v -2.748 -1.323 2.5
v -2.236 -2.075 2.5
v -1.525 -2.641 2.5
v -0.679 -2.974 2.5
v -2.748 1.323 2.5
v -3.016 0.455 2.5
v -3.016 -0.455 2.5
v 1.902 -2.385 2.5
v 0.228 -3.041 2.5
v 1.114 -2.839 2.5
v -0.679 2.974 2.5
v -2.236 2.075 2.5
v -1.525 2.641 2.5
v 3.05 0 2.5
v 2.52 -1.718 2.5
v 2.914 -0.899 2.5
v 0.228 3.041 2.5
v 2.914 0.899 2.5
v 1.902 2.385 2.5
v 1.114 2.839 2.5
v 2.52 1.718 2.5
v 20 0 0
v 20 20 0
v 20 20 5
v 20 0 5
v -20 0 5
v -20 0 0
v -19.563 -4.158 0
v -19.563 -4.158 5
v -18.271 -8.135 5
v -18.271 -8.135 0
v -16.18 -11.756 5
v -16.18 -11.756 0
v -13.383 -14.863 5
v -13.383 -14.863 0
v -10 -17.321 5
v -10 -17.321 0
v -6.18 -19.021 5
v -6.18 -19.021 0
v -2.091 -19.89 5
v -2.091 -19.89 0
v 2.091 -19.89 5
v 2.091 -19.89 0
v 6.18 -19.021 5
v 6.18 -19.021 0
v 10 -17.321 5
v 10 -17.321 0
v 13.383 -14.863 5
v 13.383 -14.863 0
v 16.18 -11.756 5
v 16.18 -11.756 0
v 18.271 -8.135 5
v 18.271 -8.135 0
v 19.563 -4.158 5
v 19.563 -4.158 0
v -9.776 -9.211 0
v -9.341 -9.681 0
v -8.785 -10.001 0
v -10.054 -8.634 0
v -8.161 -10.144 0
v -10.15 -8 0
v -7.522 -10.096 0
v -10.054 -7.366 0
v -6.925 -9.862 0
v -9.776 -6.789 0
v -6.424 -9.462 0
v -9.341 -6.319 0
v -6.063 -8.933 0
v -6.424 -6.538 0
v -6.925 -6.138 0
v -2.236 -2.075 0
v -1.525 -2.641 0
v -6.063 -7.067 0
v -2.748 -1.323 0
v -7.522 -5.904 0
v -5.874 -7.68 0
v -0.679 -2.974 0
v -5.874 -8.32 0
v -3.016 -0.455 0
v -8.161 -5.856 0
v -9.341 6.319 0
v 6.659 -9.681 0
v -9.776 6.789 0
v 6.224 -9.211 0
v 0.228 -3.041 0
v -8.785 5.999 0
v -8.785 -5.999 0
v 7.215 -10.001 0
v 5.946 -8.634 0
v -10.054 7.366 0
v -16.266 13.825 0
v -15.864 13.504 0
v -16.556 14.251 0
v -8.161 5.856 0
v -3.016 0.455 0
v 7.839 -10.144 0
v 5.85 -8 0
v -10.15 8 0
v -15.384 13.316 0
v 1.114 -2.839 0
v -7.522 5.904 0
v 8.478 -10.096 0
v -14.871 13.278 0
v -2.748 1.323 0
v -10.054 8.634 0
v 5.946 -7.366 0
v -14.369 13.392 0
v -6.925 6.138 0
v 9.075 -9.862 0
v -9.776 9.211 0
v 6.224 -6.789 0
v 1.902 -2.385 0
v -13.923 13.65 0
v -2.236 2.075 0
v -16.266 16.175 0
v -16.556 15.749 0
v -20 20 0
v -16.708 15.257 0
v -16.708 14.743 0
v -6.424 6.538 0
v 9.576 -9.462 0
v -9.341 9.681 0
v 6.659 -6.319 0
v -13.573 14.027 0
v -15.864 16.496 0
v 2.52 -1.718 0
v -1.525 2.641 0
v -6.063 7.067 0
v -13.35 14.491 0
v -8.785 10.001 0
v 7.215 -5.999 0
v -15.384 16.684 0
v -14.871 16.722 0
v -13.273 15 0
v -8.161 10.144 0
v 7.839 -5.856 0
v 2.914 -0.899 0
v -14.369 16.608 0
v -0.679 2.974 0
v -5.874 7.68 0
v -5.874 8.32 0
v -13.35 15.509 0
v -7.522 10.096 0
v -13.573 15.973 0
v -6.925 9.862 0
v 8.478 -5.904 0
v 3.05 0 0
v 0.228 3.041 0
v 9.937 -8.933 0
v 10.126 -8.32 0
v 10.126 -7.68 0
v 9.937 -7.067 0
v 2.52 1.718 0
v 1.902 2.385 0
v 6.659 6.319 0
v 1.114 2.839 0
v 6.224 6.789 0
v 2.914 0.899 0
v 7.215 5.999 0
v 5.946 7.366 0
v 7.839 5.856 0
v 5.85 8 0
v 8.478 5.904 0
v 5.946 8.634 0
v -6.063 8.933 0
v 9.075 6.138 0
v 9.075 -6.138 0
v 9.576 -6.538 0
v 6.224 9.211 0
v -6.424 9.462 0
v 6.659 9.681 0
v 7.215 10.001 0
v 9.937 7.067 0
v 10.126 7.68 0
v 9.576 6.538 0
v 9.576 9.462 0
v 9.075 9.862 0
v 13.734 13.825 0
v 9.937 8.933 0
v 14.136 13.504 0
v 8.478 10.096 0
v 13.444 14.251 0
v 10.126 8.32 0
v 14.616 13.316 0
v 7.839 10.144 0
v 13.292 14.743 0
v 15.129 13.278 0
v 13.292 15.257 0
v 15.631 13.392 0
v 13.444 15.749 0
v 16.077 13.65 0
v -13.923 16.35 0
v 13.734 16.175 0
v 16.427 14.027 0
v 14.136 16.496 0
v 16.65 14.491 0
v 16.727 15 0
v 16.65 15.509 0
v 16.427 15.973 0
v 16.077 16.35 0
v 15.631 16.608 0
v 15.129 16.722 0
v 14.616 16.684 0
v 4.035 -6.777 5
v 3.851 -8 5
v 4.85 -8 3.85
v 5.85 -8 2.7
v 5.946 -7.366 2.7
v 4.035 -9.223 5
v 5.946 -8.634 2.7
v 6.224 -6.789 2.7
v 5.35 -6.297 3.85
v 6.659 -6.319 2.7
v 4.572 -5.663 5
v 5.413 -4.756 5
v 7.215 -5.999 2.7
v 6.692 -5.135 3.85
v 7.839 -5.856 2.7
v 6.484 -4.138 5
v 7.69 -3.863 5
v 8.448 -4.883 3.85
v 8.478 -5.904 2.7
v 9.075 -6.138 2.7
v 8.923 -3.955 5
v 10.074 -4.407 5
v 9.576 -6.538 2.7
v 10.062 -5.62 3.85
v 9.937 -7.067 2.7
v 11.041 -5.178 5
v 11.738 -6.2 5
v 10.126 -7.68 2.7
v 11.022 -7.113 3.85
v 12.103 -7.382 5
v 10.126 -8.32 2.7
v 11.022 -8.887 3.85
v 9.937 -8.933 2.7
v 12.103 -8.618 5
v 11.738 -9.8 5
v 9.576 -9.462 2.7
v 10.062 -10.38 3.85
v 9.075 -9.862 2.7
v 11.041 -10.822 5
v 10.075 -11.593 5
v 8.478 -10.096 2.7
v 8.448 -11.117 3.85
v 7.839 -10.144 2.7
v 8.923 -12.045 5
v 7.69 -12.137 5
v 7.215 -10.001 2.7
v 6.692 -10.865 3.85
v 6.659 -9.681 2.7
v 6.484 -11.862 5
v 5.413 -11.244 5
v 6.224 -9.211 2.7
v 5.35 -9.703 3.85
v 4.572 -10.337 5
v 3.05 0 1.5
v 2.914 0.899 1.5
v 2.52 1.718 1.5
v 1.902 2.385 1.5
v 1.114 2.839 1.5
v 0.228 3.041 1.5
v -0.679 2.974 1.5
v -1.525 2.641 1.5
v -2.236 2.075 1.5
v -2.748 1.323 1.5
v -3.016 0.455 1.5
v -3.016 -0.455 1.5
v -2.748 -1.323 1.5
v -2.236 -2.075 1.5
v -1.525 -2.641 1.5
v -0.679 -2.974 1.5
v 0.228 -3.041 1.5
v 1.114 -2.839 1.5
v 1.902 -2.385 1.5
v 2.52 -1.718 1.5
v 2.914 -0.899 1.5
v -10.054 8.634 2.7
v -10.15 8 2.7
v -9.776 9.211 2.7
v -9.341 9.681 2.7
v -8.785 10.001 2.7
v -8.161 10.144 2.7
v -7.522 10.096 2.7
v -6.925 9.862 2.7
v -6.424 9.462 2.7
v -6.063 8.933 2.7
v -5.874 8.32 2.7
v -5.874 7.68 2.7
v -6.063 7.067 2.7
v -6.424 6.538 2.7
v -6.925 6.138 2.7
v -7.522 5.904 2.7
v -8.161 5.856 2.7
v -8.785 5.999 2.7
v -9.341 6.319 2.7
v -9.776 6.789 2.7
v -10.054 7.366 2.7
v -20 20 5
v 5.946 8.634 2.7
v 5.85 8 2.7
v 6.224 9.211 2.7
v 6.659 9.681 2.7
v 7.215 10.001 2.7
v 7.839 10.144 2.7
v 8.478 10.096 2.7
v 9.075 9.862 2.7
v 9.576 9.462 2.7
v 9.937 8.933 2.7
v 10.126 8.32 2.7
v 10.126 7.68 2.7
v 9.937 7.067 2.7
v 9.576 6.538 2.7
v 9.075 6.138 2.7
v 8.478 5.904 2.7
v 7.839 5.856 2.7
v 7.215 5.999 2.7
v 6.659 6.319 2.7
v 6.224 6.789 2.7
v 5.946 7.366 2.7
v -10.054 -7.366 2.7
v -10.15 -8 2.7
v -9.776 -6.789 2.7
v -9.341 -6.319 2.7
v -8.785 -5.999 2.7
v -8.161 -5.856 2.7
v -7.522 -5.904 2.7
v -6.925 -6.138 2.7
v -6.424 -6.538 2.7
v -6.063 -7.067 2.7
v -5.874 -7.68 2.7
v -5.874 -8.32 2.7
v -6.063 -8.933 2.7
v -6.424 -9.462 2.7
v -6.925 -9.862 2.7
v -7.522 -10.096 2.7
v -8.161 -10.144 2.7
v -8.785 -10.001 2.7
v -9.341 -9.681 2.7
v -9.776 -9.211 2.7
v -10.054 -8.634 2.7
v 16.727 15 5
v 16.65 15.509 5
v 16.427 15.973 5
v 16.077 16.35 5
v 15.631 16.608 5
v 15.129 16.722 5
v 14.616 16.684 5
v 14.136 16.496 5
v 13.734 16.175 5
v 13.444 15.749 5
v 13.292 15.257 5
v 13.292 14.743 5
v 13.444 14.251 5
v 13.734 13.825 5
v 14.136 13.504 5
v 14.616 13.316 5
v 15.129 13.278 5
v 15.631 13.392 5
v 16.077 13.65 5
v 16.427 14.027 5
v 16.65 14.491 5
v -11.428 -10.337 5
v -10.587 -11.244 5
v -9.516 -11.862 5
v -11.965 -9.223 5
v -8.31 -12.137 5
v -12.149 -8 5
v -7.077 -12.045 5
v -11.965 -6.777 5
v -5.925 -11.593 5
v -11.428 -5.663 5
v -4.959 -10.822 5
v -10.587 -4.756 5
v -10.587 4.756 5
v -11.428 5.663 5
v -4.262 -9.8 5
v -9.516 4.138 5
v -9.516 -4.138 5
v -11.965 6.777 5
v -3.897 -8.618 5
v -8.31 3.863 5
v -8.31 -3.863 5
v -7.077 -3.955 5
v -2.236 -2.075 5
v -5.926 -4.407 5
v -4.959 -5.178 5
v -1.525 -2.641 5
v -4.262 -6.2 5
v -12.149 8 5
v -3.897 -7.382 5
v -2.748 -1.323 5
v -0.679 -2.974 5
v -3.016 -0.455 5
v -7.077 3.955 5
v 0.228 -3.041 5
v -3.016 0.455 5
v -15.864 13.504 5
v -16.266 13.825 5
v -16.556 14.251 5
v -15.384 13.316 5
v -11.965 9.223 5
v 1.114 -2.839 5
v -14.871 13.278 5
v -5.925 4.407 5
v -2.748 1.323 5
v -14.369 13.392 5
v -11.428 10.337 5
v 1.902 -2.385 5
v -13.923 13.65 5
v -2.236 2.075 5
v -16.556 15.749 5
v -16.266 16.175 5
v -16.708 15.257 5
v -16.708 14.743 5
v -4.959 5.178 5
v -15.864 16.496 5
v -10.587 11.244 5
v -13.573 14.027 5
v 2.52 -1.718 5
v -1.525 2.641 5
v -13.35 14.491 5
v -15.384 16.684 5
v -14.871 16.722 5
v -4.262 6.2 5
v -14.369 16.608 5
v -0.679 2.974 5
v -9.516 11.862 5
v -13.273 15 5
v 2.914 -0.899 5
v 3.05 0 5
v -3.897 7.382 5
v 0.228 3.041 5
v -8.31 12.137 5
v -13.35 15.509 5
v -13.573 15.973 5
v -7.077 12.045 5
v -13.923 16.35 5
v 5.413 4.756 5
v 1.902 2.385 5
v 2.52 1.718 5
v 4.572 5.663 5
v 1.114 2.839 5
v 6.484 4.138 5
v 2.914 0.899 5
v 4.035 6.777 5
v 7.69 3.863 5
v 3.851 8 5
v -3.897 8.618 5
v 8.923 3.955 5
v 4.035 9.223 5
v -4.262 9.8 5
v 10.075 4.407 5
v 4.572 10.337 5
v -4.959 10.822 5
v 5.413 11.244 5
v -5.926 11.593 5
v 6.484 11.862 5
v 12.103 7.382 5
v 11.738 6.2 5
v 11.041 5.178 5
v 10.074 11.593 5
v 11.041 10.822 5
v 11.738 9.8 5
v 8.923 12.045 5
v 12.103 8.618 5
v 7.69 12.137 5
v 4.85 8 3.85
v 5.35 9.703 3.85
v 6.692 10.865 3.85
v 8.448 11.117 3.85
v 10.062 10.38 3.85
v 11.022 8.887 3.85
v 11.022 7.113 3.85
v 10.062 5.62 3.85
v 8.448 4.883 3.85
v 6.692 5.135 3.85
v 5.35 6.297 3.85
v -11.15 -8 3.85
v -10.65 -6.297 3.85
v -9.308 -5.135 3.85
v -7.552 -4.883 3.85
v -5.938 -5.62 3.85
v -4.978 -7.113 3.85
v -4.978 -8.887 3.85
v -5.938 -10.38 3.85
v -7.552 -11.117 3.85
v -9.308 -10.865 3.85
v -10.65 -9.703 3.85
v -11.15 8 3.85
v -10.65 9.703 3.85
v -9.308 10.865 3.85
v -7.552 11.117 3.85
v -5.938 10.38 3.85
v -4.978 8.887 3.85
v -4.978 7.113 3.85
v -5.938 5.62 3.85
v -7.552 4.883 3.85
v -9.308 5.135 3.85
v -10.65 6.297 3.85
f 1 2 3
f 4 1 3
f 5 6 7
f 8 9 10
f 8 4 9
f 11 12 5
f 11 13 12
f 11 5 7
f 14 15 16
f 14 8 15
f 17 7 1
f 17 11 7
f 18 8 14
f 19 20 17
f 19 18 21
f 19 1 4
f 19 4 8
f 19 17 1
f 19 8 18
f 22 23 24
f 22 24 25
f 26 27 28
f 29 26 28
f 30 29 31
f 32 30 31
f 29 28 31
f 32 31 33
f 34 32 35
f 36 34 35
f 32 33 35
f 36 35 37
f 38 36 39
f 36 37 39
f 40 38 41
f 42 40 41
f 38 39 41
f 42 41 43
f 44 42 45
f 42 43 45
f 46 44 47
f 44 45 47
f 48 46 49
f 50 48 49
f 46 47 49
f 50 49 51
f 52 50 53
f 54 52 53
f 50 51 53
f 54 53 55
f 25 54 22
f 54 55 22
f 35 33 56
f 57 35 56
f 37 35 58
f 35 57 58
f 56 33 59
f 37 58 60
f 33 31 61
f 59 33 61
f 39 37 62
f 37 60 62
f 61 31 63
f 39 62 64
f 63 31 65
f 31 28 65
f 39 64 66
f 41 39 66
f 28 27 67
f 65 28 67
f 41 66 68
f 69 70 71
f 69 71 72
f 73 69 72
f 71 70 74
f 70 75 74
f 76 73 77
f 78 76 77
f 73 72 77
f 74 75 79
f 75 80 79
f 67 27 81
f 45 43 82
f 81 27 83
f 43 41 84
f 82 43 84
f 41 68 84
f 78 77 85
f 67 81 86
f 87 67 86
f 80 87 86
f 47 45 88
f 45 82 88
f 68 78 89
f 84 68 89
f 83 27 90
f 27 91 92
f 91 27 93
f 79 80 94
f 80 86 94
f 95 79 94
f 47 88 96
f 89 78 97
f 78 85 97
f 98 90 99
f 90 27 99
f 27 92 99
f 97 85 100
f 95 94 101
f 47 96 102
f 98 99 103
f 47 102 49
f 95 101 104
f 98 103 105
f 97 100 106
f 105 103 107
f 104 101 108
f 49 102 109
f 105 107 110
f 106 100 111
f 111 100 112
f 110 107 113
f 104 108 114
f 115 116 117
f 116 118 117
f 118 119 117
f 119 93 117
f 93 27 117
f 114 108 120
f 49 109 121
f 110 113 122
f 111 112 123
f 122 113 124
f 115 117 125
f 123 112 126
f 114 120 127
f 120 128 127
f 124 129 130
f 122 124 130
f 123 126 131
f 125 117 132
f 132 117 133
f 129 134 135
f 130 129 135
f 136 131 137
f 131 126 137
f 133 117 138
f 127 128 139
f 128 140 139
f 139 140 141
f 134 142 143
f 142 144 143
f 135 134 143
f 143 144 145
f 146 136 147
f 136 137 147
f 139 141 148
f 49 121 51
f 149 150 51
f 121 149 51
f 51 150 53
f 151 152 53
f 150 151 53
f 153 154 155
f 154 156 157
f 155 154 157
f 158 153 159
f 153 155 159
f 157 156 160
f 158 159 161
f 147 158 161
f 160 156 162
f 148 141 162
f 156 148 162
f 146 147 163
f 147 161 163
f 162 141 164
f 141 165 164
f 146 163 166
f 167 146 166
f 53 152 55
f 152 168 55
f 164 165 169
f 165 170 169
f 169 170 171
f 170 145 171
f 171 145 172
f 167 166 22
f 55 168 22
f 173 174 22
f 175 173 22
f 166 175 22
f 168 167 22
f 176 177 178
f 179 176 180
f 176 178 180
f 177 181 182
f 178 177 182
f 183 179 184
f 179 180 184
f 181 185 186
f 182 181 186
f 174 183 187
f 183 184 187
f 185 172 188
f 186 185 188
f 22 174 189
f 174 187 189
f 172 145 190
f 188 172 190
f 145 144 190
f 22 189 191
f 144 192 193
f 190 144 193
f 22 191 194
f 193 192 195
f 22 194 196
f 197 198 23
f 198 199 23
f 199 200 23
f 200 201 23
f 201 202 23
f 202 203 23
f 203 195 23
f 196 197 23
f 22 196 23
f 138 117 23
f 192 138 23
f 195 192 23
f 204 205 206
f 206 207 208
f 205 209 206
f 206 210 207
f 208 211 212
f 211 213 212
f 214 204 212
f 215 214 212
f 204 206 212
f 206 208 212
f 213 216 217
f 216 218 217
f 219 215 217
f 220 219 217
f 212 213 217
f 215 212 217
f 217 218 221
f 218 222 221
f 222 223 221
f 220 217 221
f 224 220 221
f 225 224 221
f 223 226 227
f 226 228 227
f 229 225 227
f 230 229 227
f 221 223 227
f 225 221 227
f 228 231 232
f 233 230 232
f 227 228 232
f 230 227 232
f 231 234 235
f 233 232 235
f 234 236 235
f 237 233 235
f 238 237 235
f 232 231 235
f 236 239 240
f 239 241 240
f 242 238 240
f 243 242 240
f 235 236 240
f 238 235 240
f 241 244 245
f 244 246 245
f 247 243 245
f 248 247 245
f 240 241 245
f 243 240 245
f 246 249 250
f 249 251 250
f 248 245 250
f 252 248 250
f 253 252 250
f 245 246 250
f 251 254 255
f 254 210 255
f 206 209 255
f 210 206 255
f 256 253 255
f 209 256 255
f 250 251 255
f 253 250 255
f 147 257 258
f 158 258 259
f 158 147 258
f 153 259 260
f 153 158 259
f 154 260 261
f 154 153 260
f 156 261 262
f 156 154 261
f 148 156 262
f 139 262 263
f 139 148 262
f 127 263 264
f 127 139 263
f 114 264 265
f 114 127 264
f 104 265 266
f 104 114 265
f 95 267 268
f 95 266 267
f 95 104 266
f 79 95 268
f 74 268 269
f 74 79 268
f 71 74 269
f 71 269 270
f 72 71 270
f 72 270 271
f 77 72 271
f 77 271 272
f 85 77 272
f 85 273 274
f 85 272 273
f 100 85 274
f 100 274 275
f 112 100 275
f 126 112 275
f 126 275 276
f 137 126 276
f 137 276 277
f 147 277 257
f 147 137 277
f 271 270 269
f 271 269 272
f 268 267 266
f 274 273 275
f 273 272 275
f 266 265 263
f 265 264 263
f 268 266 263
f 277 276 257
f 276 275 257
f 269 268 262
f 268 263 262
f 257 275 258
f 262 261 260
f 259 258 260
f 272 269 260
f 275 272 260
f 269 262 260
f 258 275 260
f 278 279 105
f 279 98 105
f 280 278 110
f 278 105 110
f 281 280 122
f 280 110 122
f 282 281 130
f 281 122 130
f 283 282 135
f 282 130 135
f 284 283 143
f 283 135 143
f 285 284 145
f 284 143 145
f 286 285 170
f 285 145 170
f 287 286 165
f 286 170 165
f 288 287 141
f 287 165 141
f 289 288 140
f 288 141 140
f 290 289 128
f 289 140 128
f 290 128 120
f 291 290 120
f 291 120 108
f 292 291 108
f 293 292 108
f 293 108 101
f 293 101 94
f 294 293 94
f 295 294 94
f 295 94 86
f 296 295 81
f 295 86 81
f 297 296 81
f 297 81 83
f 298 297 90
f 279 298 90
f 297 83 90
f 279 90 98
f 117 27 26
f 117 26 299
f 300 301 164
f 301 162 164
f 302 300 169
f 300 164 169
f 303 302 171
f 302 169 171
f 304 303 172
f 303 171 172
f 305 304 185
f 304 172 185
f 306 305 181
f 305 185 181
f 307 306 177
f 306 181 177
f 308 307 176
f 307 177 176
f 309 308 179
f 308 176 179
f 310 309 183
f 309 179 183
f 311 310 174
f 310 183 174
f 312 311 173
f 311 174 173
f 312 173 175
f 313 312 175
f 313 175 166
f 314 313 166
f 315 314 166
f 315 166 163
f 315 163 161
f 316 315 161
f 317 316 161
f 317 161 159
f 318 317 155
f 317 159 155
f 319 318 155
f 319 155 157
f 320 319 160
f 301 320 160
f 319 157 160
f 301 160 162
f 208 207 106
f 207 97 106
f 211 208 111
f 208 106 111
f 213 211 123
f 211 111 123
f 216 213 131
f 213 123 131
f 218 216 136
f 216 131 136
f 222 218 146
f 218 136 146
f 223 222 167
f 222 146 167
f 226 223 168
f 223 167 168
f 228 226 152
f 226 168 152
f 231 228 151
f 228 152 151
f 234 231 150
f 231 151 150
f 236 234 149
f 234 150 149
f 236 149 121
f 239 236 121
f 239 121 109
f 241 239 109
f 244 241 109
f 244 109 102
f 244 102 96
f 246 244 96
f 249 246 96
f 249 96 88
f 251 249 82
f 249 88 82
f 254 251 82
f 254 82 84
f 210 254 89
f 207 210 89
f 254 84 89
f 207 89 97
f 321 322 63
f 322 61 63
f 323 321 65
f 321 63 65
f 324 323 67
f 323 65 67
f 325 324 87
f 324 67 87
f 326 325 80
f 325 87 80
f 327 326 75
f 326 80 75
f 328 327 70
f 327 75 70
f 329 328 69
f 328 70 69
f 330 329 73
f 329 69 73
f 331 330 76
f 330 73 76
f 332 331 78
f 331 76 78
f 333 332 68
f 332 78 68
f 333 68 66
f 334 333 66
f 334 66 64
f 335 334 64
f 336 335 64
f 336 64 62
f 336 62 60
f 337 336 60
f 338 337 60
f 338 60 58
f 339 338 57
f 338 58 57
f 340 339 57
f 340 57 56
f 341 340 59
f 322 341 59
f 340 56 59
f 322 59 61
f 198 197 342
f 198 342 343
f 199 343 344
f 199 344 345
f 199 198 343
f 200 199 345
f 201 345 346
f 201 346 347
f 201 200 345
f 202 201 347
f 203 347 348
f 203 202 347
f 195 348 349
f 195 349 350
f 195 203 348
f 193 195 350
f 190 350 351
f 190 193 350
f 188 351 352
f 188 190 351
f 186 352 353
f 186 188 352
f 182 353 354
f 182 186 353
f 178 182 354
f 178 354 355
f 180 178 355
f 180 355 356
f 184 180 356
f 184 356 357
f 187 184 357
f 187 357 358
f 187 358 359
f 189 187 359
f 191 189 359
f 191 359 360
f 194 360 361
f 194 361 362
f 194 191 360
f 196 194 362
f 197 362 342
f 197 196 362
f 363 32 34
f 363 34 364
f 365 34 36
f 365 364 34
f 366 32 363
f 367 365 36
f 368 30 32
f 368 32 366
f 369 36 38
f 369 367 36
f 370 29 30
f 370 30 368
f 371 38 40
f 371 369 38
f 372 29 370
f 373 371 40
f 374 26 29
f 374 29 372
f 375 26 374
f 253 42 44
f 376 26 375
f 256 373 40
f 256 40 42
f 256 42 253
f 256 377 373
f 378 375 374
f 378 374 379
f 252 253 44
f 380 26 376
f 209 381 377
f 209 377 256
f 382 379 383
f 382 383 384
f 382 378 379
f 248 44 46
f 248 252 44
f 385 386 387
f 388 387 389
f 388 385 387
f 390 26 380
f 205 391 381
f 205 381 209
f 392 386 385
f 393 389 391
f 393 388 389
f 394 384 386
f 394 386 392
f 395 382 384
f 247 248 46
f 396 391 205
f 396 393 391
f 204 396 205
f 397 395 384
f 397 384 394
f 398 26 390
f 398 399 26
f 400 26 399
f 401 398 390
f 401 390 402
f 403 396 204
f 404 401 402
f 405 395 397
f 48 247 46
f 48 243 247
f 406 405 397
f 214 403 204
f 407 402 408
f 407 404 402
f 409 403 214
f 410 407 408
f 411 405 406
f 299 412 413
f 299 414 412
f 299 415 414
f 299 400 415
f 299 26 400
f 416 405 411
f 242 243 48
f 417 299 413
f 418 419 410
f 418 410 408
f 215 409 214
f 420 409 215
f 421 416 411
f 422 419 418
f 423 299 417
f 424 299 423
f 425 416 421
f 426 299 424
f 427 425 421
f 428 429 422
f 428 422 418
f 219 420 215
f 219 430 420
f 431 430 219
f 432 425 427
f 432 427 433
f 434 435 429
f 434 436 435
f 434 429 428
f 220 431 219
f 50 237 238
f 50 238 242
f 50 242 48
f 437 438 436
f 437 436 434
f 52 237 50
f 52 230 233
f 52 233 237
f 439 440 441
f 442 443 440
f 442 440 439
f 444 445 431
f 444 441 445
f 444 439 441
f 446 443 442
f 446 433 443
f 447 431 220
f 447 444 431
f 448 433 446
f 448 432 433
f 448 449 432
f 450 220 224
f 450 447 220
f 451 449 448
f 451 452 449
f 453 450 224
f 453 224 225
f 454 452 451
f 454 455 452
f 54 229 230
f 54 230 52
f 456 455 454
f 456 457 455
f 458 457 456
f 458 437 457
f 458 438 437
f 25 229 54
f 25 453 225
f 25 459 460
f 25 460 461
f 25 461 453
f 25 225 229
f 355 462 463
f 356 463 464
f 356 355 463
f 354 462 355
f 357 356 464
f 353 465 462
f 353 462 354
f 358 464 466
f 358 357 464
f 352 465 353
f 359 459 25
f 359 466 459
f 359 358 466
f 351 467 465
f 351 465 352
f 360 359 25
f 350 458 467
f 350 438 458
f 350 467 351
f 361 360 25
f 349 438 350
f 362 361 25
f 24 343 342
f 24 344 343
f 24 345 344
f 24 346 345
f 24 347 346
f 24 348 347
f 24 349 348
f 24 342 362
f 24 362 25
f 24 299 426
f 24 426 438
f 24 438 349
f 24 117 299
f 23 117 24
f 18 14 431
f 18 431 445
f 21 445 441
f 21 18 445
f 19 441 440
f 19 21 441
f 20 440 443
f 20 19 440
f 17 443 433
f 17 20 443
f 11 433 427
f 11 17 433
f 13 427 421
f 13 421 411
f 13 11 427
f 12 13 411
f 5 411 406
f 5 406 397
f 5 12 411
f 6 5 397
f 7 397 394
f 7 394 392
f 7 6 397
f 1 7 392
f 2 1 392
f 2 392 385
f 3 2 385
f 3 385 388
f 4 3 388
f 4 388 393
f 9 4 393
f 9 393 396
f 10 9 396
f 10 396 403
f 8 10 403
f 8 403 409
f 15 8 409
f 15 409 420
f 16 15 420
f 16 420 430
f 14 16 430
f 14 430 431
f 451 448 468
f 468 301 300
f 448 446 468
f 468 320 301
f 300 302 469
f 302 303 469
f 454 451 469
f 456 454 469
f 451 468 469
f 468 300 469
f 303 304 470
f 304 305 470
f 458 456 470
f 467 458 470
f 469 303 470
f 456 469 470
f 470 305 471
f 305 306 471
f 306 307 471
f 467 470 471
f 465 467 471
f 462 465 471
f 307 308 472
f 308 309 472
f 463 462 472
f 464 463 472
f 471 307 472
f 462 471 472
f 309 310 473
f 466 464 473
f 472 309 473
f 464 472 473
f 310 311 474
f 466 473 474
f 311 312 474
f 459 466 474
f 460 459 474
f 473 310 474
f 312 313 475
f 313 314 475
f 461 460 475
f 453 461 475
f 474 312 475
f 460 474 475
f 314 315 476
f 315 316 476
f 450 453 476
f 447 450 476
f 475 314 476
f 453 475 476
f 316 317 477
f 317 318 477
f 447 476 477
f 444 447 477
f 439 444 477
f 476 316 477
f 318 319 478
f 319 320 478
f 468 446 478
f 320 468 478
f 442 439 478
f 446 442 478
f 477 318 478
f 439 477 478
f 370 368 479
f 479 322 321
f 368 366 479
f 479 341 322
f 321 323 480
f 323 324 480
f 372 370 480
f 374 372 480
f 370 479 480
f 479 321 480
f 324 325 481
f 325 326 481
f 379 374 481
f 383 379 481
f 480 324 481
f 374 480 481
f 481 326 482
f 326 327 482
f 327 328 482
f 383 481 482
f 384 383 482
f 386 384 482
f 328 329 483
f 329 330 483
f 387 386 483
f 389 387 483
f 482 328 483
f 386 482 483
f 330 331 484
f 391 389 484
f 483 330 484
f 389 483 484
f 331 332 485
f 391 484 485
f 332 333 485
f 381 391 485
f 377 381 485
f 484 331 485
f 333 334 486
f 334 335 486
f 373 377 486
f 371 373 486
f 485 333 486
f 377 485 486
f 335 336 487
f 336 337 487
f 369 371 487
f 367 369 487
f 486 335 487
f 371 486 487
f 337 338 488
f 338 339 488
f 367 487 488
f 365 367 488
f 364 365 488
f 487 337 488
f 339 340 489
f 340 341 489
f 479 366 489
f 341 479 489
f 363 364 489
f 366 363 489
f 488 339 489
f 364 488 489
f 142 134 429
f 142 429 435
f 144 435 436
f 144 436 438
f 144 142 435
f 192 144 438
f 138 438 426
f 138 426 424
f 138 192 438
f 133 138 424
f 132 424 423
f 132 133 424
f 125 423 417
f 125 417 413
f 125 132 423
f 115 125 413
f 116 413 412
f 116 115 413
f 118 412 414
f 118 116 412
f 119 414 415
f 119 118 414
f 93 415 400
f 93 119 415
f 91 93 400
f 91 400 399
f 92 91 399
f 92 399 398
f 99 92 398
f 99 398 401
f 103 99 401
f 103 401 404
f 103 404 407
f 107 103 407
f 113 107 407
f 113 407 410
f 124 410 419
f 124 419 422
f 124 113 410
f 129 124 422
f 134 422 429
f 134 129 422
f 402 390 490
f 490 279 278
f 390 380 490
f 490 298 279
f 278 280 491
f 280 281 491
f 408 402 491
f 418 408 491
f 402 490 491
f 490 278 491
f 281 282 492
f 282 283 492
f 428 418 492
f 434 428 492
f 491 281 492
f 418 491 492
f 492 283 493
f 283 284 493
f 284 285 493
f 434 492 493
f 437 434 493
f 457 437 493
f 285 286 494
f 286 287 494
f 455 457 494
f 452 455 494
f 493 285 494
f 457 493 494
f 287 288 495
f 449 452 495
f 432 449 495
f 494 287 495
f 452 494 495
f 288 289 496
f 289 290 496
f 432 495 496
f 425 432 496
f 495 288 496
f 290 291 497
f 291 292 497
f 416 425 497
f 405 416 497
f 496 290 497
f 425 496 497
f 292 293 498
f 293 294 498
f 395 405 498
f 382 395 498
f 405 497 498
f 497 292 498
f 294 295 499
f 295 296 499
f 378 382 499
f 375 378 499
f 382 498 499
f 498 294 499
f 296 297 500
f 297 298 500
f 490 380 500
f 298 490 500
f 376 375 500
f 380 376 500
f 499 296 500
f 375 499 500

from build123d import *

# Parameters (mm, degrees)
SKETCH104_R         = 3.05
SKETCH104_R_2       = 1.7272
PAD063_DEPTH        = 5
HOLE008_D           = 4.3
HOLE008_CSINK_D     = 8.298
HOLE008_CSINK_ANGLE = 82
SKETCH106_R         = 3.5
PAD064_DEPTH        = 1


with BuildPart() as part:
    # Sketch104 → Pad063 (new body)
    with BuildSketch(Plane.XY):
        with BuildLine():
            ThreePointArc((-20, 0), (0, -20), (20, 0))
            Line((20, 20), (20, 0))
            Line((-20, 20), (20, 20))
            Line((-20, 0), (-20, 20))
        make_face()
        Circle(SKETCH104_R, mode=Mode.SUBTRACT)
        with Locations((-15, 15)):
            Circle(SKETCH104_R_2, mode=Mode.SUBTRACT)
        with Locations((15, 15)):
            Circle(SKETCH104_R_2, mode=Mode.SUBTRACT)
    extrude(amount=PAD063_DEPTH)

    # Hole008 (through all)
    with Locations(Plane.XY.offset(5)):
        with Locations((-8, 8), (8, 8), (8, -8), (-8, -8)):
            CounterSinkHole(HOLE008_D / 2, HOLE008_CSINK_D / 2, counter_sink_angle=HOLE008_CSINK_ANGLE)

    # Sketch106 → Pad064 (join)
    with BuildSketch(Plane.XY.offset(1.5)):
        Circle(SKETCH106_R)
    extrude(amount=PAD064_DEPTH)


solid = part.part
